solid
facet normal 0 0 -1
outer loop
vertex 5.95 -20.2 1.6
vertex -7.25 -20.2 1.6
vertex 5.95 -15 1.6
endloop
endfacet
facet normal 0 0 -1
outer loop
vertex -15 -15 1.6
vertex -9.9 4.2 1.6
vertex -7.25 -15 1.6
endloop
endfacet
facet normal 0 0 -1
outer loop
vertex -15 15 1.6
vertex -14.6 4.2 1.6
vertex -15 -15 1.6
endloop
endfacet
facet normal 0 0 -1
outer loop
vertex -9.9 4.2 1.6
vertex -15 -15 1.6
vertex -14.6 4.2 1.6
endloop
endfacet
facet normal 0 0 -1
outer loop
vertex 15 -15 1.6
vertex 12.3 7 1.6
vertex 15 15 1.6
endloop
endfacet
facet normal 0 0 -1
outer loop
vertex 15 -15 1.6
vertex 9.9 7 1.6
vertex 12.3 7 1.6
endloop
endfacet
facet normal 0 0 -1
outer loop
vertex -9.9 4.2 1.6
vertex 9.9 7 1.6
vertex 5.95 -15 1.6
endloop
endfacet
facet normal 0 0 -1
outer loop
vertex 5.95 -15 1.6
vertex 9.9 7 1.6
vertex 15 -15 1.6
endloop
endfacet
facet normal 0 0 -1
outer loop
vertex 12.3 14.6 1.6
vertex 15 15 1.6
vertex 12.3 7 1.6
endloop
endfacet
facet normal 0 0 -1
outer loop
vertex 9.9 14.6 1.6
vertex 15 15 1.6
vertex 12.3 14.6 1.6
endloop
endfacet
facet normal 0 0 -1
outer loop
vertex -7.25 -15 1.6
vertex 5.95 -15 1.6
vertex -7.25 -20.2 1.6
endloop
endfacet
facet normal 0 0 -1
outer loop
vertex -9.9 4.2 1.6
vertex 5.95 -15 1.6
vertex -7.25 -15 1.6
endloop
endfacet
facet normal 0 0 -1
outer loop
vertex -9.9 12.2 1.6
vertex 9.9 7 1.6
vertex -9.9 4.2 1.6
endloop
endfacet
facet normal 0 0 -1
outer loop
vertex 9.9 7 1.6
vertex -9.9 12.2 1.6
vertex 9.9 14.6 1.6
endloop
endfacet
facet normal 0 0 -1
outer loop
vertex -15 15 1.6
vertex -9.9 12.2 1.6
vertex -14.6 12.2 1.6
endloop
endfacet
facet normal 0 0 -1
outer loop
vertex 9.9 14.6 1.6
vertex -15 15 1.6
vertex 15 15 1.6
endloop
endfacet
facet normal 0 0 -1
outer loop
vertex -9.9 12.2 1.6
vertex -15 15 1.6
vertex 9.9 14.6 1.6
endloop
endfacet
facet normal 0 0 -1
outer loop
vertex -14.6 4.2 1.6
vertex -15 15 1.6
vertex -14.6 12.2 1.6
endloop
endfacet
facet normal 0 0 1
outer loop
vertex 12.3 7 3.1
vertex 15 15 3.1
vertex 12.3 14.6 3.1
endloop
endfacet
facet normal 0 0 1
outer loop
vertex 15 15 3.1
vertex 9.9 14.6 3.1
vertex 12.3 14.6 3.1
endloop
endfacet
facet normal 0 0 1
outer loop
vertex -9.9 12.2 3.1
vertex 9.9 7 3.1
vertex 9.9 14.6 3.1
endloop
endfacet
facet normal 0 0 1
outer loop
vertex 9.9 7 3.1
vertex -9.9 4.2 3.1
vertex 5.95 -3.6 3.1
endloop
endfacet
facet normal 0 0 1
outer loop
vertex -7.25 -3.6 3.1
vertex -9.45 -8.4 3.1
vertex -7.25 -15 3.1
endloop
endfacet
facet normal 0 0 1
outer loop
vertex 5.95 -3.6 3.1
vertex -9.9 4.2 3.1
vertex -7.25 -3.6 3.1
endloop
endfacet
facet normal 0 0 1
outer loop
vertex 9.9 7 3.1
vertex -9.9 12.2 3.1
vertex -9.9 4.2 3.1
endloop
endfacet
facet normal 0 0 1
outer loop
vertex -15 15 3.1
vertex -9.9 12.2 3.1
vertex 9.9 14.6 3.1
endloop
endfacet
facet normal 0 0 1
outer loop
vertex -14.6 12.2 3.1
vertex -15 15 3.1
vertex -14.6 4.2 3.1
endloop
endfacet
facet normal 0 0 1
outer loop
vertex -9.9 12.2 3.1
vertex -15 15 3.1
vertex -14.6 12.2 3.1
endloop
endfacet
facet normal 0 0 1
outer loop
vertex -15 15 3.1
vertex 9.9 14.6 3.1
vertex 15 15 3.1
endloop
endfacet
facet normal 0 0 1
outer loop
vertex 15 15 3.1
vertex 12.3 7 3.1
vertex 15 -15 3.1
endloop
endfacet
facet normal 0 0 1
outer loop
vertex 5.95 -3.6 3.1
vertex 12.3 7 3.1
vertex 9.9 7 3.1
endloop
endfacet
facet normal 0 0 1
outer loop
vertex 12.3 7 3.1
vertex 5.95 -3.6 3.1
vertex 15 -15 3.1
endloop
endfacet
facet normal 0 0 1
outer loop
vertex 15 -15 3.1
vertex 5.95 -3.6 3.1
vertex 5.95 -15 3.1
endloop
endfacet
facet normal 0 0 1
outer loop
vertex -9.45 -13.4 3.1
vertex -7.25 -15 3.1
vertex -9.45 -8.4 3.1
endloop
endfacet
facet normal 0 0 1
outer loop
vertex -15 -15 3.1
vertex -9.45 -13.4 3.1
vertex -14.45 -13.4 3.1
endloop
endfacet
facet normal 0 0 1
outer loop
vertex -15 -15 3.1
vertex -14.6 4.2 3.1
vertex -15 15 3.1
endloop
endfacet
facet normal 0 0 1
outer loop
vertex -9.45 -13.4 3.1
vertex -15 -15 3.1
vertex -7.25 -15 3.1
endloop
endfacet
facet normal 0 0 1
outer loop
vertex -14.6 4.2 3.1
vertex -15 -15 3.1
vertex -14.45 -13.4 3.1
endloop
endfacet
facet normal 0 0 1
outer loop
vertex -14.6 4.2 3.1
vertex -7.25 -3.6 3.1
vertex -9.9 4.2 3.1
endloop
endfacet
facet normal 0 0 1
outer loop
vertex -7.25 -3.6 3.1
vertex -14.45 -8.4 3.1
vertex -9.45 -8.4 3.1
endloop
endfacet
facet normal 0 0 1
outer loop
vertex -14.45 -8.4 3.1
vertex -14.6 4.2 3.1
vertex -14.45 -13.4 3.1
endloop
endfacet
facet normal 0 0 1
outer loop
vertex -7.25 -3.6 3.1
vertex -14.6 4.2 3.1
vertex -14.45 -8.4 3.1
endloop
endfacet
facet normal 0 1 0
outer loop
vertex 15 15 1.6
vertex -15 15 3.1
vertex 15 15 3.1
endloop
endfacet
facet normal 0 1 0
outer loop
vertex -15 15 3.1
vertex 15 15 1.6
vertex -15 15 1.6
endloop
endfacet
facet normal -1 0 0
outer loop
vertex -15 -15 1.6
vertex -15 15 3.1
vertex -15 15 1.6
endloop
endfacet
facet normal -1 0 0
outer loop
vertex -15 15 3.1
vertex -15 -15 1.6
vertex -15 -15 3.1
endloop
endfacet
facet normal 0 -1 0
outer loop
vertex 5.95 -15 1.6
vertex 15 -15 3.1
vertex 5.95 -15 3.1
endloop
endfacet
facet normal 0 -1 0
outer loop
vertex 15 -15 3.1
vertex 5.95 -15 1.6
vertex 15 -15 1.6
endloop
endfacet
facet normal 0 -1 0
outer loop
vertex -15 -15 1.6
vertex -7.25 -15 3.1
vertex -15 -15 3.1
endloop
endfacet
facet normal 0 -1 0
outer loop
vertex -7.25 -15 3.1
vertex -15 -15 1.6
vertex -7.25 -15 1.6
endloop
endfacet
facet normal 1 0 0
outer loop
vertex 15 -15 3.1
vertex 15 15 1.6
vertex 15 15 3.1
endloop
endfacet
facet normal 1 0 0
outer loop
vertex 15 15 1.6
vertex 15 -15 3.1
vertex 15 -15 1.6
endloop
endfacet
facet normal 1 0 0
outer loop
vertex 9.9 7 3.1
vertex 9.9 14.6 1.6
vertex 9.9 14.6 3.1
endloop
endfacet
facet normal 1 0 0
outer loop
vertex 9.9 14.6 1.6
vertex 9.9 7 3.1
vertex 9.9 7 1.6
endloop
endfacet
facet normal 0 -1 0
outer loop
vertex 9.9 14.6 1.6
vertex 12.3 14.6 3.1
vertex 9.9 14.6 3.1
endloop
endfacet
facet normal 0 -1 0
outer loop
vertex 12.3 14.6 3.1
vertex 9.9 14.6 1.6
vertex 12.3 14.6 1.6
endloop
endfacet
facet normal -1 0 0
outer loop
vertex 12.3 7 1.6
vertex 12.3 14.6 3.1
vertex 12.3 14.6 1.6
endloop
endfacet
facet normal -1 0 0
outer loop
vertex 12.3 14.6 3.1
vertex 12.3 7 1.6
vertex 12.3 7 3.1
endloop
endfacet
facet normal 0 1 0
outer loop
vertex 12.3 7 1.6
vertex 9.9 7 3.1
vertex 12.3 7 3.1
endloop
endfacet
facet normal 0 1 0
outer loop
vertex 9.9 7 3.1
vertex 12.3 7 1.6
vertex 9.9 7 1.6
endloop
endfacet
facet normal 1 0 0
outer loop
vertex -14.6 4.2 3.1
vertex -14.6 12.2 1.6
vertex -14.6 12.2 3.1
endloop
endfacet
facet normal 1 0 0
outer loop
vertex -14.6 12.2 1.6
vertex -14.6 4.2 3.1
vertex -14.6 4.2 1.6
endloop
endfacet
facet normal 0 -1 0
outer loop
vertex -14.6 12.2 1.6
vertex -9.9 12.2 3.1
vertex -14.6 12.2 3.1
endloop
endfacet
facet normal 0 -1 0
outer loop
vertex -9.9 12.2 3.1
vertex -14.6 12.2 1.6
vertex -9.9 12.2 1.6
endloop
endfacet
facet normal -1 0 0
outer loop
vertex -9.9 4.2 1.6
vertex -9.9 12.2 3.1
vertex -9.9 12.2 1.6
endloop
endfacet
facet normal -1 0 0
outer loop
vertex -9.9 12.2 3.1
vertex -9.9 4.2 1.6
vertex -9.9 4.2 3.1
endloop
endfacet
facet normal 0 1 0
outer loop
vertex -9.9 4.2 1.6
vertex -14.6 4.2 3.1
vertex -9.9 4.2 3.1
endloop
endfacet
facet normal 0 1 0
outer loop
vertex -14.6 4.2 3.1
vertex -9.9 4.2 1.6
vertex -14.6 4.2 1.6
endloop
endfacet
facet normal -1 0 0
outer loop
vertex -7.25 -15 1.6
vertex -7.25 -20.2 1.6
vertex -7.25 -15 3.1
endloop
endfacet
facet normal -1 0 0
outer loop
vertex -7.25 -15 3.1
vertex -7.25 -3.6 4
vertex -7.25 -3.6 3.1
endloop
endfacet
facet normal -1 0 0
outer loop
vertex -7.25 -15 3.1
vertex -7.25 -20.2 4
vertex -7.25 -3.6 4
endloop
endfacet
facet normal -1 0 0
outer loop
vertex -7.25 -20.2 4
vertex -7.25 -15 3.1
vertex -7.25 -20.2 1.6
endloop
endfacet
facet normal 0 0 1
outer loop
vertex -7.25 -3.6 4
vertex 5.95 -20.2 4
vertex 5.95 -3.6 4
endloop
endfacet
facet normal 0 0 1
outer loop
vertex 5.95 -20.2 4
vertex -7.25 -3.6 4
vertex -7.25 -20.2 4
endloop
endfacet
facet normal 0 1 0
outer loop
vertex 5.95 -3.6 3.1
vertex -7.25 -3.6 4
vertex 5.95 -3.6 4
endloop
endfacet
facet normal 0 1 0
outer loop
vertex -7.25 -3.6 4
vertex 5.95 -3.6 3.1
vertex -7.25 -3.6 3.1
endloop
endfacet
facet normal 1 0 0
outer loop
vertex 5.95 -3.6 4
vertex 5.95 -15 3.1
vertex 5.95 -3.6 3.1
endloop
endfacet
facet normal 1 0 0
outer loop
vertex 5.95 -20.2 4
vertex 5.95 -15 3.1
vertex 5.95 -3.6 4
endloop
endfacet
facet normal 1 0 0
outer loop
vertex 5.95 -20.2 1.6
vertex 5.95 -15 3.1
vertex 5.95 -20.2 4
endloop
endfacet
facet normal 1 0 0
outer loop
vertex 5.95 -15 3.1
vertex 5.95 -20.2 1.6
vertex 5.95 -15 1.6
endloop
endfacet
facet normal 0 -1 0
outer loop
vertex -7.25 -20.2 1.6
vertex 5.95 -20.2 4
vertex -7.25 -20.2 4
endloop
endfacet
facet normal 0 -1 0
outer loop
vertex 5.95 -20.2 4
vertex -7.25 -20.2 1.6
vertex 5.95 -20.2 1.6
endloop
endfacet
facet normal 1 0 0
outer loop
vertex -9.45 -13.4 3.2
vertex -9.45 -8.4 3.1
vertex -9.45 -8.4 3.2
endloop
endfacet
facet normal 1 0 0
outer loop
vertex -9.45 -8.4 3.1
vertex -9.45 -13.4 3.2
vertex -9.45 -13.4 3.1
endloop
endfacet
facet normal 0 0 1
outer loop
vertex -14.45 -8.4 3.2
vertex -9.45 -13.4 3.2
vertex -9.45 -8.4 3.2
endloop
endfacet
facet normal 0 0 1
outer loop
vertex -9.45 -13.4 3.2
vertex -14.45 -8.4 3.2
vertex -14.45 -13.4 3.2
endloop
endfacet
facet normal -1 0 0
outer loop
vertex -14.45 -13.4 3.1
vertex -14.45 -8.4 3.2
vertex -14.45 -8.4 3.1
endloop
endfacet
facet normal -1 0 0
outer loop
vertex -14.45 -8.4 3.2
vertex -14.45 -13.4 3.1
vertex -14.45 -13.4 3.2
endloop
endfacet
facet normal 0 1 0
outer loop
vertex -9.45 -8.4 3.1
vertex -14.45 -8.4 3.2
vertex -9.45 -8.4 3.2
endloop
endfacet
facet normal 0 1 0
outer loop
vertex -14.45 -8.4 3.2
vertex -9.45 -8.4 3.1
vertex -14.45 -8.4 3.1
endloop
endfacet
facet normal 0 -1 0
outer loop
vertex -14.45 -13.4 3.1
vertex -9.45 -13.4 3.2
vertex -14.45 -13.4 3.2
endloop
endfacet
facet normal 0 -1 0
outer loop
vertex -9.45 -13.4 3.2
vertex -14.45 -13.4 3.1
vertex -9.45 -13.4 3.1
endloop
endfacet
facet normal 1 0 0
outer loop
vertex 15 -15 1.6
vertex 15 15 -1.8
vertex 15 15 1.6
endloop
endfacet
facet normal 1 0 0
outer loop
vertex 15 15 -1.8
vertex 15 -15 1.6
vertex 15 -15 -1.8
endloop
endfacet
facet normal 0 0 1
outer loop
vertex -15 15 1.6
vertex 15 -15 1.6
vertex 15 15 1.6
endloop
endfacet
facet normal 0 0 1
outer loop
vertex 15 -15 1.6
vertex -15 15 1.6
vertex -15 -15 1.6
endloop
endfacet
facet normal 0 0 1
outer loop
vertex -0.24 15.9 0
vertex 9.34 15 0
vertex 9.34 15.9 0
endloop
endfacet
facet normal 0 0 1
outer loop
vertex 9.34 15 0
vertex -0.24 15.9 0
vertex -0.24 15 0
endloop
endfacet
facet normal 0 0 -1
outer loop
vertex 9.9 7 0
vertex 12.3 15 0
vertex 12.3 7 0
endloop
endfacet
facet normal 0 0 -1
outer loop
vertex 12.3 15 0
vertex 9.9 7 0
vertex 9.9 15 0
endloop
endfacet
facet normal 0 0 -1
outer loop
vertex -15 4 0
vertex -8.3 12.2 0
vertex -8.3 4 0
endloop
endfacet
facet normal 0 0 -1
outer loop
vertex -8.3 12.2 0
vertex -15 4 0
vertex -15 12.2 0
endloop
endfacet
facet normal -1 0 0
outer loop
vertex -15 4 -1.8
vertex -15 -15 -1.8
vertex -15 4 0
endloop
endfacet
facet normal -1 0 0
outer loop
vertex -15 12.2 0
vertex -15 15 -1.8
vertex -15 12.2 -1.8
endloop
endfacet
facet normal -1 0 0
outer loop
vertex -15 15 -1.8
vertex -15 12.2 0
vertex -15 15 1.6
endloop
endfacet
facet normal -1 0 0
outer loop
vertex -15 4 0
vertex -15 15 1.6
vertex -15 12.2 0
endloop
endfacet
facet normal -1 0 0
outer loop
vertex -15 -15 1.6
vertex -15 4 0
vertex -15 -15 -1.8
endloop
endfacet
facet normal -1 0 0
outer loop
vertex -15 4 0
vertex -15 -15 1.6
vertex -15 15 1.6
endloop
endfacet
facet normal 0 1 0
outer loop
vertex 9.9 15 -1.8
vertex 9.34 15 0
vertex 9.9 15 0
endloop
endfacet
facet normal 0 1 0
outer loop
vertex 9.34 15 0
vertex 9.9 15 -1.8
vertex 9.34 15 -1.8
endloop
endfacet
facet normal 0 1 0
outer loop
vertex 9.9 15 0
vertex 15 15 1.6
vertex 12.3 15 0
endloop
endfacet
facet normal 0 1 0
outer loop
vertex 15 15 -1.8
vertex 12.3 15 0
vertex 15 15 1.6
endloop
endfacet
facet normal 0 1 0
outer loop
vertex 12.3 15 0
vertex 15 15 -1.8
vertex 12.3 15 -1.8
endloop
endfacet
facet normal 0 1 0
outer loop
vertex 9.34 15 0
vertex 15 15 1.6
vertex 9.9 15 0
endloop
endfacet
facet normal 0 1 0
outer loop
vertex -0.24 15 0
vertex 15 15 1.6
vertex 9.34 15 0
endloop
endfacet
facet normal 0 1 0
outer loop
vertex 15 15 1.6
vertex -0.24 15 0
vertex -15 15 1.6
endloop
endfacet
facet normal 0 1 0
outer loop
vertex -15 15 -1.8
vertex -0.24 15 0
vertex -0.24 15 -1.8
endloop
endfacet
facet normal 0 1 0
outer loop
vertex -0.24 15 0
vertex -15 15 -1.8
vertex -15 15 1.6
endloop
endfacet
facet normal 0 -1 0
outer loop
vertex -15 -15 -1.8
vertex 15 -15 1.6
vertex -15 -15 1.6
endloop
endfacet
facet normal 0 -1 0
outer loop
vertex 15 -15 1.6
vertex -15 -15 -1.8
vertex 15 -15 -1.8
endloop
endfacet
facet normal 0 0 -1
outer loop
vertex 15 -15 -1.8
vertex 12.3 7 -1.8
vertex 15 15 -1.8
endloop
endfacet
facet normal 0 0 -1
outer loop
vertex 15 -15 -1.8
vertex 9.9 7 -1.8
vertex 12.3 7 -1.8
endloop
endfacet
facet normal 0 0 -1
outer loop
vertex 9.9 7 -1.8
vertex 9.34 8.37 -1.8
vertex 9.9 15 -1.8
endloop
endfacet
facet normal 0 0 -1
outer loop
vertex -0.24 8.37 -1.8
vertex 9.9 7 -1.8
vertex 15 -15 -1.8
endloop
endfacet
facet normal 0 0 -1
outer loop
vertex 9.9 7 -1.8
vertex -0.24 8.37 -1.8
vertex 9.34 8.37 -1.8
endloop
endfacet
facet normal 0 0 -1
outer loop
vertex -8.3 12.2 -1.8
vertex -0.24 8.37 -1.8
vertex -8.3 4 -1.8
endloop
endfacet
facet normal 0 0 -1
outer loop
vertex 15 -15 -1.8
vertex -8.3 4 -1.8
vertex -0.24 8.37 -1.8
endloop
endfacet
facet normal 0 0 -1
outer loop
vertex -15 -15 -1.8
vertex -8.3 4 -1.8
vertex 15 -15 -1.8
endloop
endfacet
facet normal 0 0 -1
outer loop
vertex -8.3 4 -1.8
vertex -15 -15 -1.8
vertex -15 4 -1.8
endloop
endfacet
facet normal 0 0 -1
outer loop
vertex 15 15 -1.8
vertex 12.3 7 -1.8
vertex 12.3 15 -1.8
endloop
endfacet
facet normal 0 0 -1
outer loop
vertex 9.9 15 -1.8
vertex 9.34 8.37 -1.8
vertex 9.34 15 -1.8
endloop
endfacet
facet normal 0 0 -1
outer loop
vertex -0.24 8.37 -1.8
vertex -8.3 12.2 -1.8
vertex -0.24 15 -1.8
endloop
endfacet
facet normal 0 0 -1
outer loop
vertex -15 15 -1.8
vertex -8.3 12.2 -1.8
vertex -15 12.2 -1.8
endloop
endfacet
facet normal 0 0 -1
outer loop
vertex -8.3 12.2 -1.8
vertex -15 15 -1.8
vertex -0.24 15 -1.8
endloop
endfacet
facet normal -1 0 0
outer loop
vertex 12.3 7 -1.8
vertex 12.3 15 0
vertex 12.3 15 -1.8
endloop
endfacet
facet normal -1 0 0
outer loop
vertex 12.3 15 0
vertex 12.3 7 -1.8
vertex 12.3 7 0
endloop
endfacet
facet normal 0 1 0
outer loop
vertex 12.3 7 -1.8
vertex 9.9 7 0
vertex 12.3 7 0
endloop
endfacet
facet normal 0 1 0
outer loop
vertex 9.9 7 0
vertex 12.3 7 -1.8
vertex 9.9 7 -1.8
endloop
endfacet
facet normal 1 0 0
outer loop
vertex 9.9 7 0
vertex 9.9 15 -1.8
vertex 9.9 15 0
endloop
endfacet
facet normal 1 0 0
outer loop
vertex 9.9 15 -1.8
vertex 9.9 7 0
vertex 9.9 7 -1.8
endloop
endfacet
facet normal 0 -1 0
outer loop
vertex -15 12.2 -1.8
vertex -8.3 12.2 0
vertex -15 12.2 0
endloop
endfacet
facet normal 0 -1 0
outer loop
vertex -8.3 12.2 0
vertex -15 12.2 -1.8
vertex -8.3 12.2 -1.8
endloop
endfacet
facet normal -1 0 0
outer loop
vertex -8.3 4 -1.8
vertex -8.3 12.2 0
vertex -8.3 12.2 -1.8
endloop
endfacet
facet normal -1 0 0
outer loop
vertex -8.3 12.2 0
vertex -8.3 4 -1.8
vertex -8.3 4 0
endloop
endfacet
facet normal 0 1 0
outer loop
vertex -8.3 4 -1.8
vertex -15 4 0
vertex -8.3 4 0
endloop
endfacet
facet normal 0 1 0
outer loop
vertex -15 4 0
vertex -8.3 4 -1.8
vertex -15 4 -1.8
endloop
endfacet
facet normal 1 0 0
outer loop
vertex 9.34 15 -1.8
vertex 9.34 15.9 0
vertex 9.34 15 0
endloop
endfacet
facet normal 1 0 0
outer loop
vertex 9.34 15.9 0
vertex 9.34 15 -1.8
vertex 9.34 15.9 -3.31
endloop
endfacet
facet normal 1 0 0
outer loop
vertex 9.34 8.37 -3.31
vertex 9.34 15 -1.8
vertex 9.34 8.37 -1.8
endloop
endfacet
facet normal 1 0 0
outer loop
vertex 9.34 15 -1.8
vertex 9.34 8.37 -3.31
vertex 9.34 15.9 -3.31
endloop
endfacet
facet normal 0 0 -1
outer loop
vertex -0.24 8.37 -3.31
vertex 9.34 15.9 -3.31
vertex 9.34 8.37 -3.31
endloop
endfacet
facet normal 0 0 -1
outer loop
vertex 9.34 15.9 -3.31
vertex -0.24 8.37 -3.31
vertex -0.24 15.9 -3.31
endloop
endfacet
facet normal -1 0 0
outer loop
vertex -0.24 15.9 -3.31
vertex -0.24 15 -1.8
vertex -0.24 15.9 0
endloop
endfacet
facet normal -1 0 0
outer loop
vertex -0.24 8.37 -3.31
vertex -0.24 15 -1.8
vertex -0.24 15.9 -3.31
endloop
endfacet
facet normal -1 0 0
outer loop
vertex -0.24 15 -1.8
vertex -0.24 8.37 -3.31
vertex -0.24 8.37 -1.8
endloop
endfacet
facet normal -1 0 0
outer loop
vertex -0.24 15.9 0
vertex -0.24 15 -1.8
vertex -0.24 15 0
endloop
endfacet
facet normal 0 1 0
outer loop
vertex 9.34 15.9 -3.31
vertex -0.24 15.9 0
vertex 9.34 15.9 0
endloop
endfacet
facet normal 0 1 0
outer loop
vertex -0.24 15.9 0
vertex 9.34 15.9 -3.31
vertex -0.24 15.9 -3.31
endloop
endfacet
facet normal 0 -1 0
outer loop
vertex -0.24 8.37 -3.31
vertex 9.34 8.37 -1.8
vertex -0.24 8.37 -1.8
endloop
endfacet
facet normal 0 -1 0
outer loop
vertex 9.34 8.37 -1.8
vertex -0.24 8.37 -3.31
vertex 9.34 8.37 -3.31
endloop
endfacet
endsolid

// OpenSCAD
//
// Revision 3 PCB with its component envelopes
// Units: mm
//

include <dimensions.scad>

render_fn = is_undef(render_fn) ? 64 : render_fn;
$fn = render_fn;

module pcb_rect_2d(r) {
    translate([r[0], r[2]])
        square([r[1] - r[0], r[3] - r[2]]);
}

// Board footprint minus the bare areas the case is allowed to touch.
module pcb_parts_2d(windows) {
    difference() {
        square([pcb_W, pcb_L], center = true);
        for (w = windows)
            pcb_rect_2d(w);
    }
}

// Origin: board center on its underside (KiCad F.Cu, toward the floor).
module pcb_model() {
    color("green")
        translate([0, 0, pcb_board_t / 2])
            cube([pcb_W, pcb_L, pcb_board_t], center = true);

    // F.Cu parts below the board; only the support windows are bare.
    color("darkgreen")
        translate([0, 0, -pcb_bottom_parts_h])
            linear_extrude(height = pcb_bottom_parts_h)
                pcb_parts_2d(pcb_support_windows);

    color("silver")
        translate([usb_x, usb_y, -usb_h / 2])
            cube([usb_w, usb_d, usb_h], center = true);

    // B.Cu parts face the lid; only the clamp windows are bare.
    translate([0, 0, pcb_board_t]) {
        color("darkgreen")
            linear_extrude(height = pcb_top_parts_h)
                pcb_parts_2d(pcb_clamp_windows);

        color("lightgray")
            linear_extrude(height = pcb_module_h)
                pcb_rect_2d(pcb_module_rect);

        translate([status_led_x, status_led_y, status_led_h / 2])
            color("yellow")
                cube([status_led_w, status_led_l, status_led_h], center = true);

        translate([rgb_led_x, rgb_led_y, rgb_led_h / 2])
            color("white")
                cube([rgb_led_w, rgb_led_l, rgb_led_h], center = true);
    }
}

pcb_model();
